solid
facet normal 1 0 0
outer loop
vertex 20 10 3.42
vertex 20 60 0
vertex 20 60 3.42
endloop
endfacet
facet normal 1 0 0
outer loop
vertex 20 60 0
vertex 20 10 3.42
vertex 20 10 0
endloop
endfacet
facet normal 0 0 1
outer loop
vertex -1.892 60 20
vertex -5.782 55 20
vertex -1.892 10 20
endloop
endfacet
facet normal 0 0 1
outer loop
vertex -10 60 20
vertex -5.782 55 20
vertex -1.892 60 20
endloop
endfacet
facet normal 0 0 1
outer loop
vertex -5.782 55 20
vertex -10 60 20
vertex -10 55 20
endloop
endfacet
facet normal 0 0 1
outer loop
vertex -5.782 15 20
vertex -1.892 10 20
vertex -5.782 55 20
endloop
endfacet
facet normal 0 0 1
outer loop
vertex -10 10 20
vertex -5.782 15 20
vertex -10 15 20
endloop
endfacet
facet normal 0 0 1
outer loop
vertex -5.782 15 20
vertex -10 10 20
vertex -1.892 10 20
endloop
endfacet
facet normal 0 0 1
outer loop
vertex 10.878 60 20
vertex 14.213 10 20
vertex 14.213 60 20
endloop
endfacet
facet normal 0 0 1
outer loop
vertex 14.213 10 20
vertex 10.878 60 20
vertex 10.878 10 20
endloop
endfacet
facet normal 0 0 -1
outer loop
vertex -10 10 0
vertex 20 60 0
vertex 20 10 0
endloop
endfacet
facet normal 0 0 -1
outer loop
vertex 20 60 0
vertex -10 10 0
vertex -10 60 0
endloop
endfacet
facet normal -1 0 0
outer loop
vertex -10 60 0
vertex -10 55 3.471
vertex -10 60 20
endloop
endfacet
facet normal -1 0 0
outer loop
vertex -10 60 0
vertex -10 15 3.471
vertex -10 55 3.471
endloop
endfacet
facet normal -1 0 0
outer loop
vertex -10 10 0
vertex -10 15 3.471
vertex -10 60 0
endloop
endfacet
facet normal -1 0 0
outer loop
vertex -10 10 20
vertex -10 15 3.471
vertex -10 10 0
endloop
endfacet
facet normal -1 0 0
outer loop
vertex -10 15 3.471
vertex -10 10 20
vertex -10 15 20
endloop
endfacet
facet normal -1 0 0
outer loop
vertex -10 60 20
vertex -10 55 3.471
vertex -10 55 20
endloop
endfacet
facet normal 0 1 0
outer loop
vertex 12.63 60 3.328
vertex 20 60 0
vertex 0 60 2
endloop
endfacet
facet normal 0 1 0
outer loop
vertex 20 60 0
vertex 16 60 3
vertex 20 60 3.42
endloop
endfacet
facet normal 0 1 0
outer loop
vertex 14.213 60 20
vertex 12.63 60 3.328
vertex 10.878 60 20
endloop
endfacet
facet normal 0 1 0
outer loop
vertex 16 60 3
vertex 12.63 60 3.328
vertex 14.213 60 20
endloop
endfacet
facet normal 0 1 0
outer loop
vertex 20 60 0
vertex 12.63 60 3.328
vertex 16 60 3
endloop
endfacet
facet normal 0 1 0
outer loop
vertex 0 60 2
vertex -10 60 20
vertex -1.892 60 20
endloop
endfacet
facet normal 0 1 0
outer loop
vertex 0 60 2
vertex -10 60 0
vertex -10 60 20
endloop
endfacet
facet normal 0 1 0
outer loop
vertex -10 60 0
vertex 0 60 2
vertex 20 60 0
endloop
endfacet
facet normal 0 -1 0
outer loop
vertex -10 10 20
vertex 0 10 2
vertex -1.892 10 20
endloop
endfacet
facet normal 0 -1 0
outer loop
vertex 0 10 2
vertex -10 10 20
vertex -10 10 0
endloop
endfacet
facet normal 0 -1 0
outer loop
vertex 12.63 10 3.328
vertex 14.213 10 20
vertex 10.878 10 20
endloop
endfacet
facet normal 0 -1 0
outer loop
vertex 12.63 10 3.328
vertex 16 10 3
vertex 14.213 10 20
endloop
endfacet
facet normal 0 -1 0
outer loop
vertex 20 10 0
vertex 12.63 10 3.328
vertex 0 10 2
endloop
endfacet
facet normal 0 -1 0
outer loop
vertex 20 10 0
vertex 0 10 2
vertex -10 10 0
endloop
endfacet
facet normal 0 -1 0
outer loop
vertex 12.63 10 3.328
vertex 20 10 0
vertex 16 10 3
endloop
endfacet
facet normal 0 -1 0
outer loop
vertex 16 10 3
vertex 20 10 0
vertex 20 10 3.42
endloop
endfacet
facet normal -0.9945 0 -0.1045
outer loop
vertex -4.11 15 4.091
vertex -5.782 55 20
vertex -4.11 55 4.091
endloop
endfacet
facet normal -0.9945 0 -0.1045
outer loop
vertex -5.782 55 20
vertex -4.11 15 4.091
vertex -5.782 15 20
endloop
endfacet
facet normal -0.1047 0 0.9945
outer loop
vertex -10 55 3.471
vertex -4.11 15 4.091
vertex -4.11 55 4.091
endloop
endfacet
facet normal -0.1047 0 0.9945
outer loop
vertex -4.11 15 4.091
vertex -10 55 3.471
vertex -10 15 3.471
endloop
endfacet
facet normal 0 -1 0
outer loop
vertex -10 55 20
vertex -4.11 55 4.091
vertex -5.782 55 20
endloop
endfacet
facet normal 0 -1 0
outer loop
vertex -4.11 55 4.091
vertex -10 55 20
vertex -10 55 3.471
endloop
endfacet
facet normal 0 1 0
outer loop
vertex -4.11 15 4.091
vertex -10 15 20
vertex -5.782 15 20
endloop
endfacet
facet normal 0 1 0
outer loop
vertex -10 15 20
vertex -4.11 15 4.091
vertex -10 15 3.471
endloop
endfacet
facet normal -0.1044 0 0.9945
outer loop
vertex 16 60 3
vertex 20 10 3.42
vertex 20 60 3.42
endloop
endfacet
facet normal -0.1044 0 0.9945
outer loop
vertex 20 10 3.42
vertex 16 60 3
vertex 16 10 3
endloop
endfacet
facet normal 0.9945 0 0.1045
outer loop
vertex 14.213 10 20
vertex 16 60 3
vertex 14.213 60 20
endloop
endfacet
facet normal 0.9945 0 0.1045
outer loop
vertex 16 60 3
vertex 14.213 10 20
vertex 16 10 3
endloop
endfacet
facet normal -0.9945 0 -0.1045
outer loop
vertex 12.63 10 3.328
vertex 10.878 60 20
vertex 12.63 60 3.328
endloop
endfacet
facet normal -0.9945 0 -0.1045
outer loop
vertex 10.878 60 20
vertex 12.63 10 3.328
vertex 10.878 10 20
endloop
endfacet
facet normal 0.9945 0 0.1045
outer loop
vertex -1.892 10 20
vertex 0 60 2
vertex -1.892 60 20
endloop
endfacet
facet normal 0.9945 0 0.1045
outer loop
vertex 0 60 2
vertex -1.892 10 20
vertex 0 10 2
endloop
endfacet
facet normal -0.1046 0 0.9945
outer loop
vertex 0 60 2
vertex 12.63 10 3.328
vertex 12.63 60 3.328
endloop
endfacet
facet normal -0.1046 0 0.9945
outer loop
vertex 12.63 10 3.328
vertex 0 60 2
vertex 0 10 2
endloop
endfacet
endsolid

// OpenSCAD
difference () {

	translate([-10,10,0]) {
		difference() {
			// foot in mm
			cube([30,50,20]);
			color("red") translate([-14,5,2]) rotate([0,-6,0]) cube([20,40,40]);
			color("red") translate([26,-1,3]) rotate([0,-6,0]) cube([20,52,40]);
		}
	}

	// leg in inches
	color("green") translate([0,0,2]) rotate([0,-6,0]) scale(25.4) cube([0.5, 7.5, 11.5]);

}
